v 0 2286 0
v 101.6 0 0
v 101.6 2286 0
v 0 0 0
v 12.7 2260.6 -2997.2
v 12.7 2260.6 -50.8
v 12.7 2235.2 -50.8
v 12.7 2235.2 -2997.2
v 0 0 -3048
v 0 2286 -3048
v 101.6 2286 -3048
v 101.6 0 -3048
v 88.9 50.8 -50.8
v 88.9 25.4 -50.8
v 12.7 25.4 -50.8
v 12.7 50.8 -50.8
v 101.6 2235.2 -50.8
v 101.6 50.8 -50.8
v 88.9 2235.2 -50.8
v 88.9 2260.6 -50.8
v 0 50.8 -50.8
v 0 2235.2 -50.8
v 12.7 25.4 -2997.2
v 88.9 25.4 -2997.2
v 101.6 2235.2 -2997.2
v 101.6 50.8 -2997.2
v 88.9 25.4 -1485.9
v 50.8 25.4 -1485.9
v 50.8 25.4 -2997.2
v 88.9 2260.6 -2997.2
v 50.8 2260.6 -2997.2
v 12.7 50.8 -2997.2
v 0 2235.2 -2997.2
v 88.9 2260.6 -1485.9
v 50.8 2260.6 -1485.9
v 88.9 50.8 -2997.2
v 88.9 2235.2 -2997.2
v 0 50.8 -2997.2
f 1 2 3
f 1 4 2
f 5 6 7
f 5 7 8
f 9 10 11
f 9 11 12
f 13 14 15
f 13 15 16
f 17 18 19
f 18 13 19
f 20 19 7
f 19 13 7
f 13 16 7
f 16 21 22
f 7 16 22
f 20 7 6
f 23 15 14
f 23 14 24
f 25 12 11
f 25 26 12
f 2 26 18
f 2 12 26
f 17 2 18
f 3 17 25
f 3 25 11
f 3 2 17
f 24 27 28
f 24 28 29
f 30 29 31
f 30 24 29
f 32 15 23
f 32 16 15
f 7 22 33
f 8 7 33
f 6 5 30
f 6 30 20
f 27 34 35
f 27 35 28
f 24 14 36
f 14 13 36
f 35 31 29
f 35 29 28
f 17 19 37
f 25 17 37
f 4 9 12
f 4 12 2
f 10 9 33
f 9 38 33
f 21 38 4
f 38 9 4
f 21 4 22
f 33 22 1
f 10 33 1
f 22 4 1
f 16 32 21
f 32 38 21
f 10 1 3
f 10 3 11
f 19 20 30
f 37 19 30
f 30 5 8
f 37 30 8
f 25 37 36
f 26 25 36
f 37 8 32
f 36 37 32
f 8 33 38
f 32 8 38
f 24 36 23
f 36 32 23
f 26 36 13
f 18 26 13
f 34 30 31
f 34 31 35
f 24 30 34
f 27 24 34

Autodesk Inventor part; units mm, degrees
ref_plane "YZ Plane" through (0, 0, 0) normal (1, 0, 0) x (0, 1, 0)
sketch "Sketch1" plane through (0, 0, 0) normal (1, 0, 0) x (0, 1, 0)
  line L0 (0, 0) -> (2286, 0)
  line L1 (2286, 0) -> (2286, -3048)
  line L2 (2286, -3048) -> (0, -3048)
  line L3 (0, -3048) -> (0, 0)
  line L4 (50.8, -50.8) -> (2235.2, -50.8)
  line L5 (2235.2, -50.8) -> (2235.2, -2997.2)
  line L6 (2235.2, -2997.2) -> (50.8, -2997.2)
  line L7 (50.8, -2997.2) -> (50.8, -50.8)
  point P0 (2235.2, -1524)
  point P1 (2286, -1524)
  point P2 (1143, -2997.2)
  point P3 (1143, -3048)
  dimension "d0" = 50.8
  dimension "d1" = 50.8
  dimension "d2" = 3048
  dimension "d3" = 2286
extrude "BaseFrame" add sketch "Sketch1" along normal blind 101.6
ref_plane "Work Plane1" through (50.8, 0, 0) normal (1, 0, 0) x (0, 0, -1)
sketch "Sketch2" plane through (50.8, 0, 0) normal (1, 0, 0) x (0, 0, -1)
  line L0 (0, 0) -> (0, 2286) construction
  line L1 (0, 2286) -> (3048, 2286) construction
  line L2 (3048, 2286) -> (3048, 0) construction
  line L3 (3048, 0) -> (0, 0) construction
  line L4 (3022.6, 2260.6) -> (25.4, 2260.6)
  line L5 (25.4, 2260.6) -> (25.4, 25.4) construction
  line L6 (25.4, 25.4) -> (3022.6, 25.4)
  line L7 (3022.6, 25.4) -> (3022.6, 2260.6) construction
  line L8 (2997.2, 50.8) -> (2997.2, 2235.2) projected
  line L9 (50.8, 2235.2) -> (50.8, 50.8) projected
  line L10 (50.8, 2235.2) -> (50.8, 2260.6)
  line L11 (2997.2, 2235.2) -> (2997.2, 2260.6)
  line L12 (2997.2, 50.8) -> (2997.2, 25.4)
  line L13 (50.8, 50.8) -> (50.8, 25.4)
  dimension "d6" = 25.4
extrude "DoorSlot" cut sketch "Sketch2" along normal mid plane 76.2
sketch "Sketch3" plane through (88.9, 0, 0) normal (-1, 0, 0) x (0, 0, 1)
  line L0 (-50.8, 25.4) -> (-2997.2, 25.4) projected
  line L1 (-2997.2, 2260.6) -> (-50.8, 2260.6) projected
  line L2 (-2997.2, 2260.6) -> (-1485.9, 2260.6)
  line L3 (-1485.9, 2260.6) -> (-1485.9, 25.4)
  line L4 (-1485.9, 25.4) -> (-2997.2, 25.4)
  line L5 (-2997.2, 25.4) -> (-2997.2, 2260.6)
  dimension "d9" = 1511.3
extrude "StationaryPanel" add sketch "Sketch3" along normal blind 38.1 separate body
ref_plane "Work Plane2" through (0, 0, -1524) normal (0, 0, 1) x (1, 0, 0)
mirror "MirrorRight" [suppressed]
mirror "MirrorRightExterior" [suppressed]
mirror "MirrorLeftExterior" [suppressed]
equation "\"d0\" = FrameWidth"
equation "\"d1\" = d0"
equation "\"d2\" = Width"
equation "\"d3\" = Height"
equation "\"d4\" = Depth"
equation "\"d6\" = 0.5 * FrameWidth"
equation "\"d7\" = 0.75 * Depth"
equation "\"d10\" = 0.375 * Depth"
equation "\"Width\" = 3048"
equation "\"Depth\" = 101.6"
equation "\"Height\" = 2286"
equation "\"FrameWidth\" = 50.8"
properties part number "SlidingDoorFrame"
